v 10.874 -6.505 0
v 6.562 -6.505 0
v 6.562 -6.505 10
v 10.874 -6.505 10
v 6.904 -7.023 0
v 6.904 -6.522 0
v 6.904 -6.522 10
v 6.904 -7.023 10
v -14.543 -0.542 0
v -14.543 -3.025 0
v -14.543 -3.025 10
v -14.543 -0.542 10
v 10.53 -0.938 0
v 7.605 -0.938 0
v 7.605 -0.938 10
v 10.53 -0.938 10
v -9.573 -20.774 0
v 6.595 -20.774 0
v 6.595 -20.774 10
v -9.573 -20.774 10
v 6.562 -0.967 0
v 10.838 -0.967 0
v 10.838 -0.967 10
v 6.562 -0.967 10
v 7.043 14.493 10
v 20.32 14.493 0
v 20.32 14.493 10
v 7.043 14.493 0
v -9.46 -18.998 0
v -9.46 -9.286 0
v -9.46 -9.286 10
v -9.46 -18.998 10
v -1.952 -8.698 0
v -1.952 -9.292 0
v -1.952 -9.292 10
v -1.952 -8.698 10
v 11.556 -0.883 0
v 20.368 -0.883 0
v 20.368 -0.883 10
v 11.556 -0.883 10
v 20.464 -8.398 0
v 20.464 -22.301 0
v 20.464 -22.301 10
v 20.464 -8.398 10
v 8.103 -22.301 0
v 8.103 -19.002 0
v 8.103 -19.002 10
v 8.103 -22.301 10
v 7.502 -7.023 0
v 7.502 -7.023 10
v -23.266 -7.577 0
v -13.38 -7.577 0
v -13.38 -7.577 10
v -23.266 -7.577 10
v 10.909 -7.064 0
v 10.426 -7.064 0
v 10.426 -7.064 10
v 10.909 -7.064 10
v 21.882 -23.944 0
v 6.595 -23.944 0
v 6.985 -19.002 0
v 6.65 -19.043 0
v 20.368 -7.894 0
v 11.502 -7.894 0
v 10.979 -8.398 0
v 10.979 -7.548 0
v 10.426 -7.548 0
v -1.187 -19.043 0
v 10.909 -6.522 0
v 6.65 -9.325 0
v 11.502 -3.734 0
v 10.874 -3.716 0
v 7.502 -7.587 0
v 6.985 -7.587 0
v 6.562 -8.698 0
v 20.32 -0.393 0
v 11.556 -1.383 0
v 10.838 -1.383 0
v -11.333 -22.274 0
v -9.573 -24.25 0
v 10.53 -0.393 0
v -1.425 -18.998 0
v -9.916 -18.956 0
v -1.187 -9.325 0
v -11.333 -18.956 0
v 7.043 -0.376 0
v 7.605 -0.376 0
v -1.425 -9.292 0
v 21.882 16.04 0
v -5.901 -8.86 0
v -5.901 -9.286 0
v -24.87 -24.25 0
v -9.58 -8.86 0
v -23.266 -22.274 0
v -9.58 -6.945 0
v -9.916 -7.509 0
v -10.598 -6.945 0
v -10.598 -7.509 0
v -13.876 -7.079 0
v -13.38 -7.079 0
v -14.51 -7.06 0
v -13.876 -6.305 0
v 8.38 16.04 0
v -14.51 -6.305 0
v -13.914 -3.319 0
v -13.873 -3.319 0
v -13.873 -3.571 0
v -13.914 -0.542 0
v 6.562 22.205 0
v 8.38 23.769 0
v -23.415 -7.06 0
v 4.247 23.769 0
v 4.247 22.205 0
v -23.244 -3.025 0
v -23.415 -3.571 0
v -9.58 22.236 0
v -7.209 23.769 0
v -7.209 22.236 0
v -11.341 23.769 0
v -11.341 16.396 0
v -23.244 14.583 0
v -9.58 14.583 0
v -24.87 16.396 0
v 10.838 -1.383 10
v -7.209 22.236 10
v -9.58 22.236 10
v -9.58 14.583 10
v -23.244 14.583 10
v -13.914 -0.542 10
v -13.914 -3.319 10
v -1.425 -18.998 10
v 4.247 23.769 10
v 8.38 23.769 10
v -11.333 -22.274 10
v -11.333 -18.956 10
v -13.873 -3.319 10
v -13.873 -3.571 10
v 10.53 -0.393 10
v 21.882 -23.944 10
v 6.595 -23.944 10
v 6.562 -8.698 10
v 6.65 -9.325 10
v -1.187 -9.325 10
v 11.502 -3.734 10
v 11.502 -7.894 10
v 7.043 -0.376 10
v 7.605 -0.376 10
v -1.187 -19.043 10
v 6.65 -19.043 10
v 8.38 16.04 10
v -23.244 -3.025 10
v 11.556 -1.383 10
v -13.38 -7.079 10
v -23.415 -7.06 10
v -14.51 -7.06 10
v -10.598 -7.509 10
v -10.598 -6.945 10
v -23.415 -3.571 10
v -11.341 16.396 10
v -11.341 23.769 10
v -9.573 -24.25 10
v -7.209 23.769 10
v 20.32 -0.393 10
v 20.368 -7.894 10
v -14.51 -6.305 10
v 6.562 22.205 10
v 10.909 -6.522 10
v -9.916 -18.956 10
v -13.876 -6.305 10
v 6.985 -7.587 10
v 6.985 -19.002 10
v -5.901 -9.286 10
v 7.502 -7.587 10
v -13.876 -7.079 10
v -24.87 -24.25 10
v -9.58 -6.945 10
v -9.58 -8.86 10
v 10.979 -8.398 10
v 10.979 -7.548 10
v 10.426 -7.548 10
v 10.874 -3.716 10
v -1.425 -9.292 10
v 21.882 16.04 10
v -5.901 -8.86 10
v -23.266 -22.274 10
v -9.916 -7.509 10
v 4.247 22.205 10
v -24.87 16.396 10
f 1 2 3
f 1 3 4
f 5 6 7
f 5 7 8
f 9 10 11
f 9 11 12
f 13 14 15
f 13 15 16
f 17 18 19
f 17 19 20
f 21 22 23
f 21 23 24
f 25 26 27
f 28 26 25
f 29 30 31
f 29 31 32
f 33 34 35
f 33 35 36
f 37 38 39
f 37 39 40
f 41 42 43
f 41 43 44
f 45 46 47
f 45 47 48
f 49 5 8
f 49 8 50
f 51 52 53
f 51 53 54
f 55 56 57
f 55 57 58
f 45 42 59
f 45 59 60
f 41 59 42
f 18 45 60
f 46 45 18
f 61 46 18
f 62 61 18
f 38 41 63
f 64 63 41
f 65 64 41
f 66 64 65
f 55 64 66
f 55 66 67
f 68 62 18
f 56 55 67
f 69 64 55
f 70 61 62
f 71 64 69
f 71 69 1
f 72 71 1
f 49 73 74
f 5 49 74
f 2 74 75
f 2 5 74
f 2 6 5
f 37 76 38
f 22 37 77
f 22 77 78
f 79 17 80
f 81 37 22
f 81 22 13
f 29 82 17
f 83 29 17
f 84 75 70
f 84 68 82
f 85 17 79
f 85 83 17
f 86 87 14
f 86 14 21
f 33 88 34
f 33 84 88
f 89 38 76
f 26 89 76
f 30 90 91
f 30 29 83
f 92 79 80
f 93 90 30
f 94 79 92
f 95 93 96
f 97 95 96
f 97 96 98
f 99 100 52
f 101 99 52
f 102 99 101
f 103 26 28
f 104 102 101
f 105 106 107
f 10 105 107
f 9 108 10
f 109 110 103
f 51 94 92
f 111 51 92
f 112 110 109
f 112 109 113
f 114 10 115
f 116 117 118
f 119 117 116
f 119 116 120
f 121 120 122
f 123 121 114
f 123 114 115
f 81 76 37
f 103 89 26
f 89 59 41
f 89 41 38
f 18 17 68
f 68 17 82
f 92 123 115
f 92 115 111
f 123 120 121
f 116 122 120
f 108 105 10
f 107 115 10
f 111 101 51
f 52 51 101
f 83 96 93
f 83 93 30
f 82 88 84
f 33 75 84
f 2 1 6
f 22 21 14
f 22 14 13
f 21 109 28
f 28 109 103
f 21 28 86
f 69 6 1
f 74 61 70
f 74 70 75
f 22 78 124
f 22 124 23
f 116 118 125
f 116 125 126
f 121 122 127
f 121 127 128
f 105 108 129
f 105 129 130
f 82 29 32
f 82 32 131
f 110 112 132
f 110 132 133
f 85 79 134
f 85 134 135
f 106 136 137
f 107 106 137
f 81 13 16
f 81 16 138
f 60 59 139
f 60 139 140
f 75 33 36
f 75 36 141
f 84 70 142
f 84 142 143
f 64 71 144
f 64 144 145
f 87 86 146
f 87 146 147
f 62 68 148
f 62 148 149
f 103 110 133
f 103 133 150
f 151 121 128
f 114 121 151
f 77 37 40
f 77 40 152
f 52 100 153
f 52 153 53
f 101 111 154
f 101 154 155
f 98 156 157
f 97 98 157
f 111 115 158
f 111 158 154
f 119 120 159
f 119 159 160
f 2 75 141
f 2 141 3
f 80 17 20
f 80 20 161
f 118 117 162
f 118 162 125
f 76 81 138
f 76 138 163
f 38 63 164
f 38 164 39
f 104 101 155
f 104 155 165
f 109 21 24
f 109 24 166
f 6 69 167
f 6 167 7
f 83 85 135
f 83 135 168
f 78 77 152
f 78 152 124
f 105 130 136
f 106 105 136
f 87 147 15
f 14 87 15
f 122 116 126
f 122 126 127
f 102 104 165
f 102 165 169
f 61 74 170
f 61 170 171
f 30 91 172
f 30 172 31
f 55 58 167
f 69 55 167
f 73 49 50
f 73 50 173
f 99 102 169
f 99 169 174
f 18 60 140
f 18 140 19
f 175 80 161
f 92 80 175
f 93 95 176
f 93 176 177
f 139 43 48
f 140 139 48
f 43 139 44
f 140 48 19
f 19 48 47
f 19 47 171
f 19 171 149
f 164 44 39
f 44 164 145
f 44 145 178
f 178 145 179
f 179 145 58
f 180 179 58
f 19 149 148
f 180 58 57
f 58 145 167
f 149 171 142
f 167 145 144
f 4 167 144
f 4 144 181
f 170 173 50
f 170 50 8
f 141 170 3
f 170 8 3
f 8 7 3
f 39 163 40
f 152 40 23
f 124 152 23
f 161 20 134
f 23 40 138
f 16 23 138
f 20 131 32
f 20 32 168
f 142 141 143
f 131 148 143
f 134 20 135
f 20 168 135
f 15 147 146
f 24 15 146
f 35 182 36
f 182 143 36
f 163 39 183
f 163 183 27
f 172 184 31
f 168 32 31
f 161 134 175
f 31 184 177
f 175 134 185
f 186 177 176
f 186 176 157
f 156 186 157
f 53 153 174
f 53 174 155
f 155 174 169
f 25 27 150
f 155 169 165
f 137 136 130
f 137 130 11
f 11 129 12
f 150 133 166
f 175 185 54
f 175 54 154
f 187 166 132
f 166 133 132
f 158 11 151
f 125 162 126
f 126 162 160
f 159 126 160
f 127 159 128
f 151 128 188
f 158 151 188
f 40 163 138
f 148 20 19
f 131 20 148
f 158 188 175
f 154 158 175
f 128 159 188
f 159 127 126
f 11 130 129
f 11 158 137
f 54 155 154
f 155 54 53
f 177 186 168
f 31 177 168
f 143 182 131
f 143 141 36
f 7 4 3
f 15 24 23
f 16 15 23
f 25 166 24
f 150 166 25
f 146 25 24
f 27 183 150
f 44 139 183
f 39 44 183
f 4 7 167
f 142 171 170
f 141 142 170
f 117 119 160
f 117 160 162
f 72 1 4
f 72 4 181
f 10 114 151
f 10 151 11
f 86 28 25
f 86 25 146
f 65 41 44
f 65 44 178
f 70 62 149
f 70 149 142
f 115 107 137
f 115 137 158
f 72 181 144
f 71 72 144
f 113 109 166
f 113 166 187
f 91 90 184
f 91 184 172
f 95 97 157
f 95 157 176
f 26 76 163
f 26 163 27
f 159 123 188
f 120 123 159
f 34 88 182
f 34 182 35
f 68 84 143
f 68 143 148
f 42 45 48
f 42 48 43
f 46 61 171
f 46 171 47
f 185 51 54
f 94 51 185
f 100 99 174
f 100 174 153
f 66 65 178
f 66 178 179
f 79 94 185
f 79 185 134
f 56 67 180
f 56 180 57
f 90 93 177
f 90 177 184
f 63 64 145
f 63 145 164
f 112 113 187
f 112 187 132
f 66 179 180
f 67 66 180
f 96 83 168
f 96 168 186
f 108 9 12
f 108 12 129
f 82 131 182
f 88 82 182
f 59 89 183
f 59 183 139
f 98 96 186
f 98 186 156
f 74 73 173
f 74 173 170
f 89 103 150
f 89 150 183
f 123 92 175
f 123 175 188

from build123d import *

# Parameters (mm, degrees)
PAD_DEPTH            = 10
POCKET_DEPTH         = 0.001
POCKET_DEPTH_BACK    = 10.001
POCKET001_DEPTH      = 0.001
POCKET001_DEPTH_BACK = 10.001
POCKET002_DEPTH      = 0.001
POCKET002_DEPTH_BACK = 10.001
POCKET003_DEPTH      = 0.001
POCKET003_DEPTH_BACK = 10.001
POCKET004_DEPTH      = 0.001
POCKET004_DEPTH_BACK = 10.001
POCKET005_DEPTH      = 0.001
POCKET005_DEPTH_BACK = 10.001
POCKET006_DEPTH      = 0.001
POCKET006_DEPTH_BACK = 10.001
POCKET007_DEPTH      = 0.001
POCKET007_DEPTH_BACK = 10.001


with BuildPart() as part:
    # Sketch → Pad (new body)
    with BuildSketch(Plane.XY):
        Polygon((-24.869964, 16.395561), (-11.340966, 16.395561), (-11.340966, 23.768572), (8.37961, 23.768572), (8.37961, 16.040237), (21.881983, 16.040237), (21.881983, -23.94381), (6.594811, -23.94381), (6.594811, -20.773636), (-9.572513, -20.773636), (-9.572513, -24.250378), (-24.869964, -24.250378), align=None)
    extrude(amount=PAD_DEPTH)

    # Sketch001 → Pocket (cut, two sides)
    with BuildSketch(Plane.XY) as pocket_sk:
        Polygon((7.042854, 14.493185), (7.042854, -0.376181), (7.60472, -0.376181), (7.60472, -0.938048), (10.529679, -0.938048), (10.529679, -0.392844), (20.320467, -0.392844), (20.320467, 4.433404), (20.320467, 12.107393), (20.320467, 14.493185), (11.347224, 14.493185), (7.737097, 14.493185), align=None)
    extrude(amount=-POCKET_DEPTH, mode=Mode.SUBTRACT)
    extrude(pocket_sk.sketch, amount=POCKET_DEPTH_BACK, mode=Mode.SUBTRACT)

    # Sketch002 → Pocket001 (cut, two sides)
    with BuildSketch(Plane.XY) as pocket001_sk:
        Polygon((6.562266, -8.697514), (6.562266, 17.730482), (6.562266, 20.972402), (6.562266, 22.205465), (4.247283, 22.205465), (4.247283, 23.77135), (-7.208705, 23.77135), (-7.208705, 22.236126), (-9.579967, 22.236126), (-9.579967, 20.501596), (-9.579967, 17.725863), (-9.579967, -8.859713), (-5.78053, -8.859713), (-5.78053, -9.246999), (-1.996924, -9.246999), (-1.996924, -8.697514), align=None)
    extrude(amount=-POCKET001_DEPTH, mode=Mode.SUBTRACT)
    extrude(pocket001_sk.sketch, amount=POCKET001_DEPTH_BACK, mode=Mode.SUBTRACT)

    # Sketch003 → Pocket002 (cut, two sides)
    with BuildSketch(Plane.XY) as pocket002_sk:
        Polygon((-9.555696, 14.58253), (-11.251103, 14.58253), (-14.140704, 14.58253), (-23.244276, 14.58253), (-23.244276, 10.916287), (-23.244276, 3.175509), (-23.244276, -3.024841), (-14.543381, -3.024841), (-14.543381, -0.542157), (-13.913779, -0.542157), (-13.913779, -3.319152), (-9.555696, -3.319152), align=None)
    extrude(amount=-POCKET002_DEPTH, mode=Mode.SUBTRACT)
    extrude(pocket002_sk.sketch, amount=POCKET002_DEPTH_BACK, mode=Mode.SUBTRACT)

    # Sketch004 → Pocket003 (cut, two sides)
    with BuildSketch(Plane.XY) as pocket003_sk:
        Polygon((-23.265747, -7.57667), (-23.265747, -22.274162), (-20.999838, -22.274162), (-13.232408, -22.274162), (-11.332763, -22.274162), (-11.332763, -18.95647), (-9.916094, -18.95647), (-9.916094, -7.509449), (-10.598124, -7.509449), (-10.598124, -6.945273), (-9.384972, -6.945273), (-9.384972, -0.656561), (-13.872682, -0.656561), (-13.872682, -3.571327), (-23.414576, -3.571327), (-23.414576, -7.059722), (-14.509603, -7.059722), (-14.509603, -6.304652), (-13.875799, -6.304652), (-13.875799, -7.078746), (-13.37953, -7.078746), (-13.37953, -7.57667), align=None)
    extrude(amount=-POCKET003_DEPTH, mode=Mode.SUBTRACT)
    extrude(pocket003_sk.sketch, amount=POCKET003_DEPTH_BACK, mode=Mode.SUBTRACT)

    # Sketch005 → Pocket004 (cut, two sides)
    with BuildSketch(Plane.XY) as pocket004_sk:
        Polygon((-9.459572, -9.286458), (-9.459572, -18.99835), (-6.993228, -18.99835), (-2.81149, -18.99835), (-1.42501, -18.99835), (-1.42501, -9.292158), (-1.95218, -9.292158), (-1.95218, -8.499968), (-5.901244, -8.499968), (-5.901244, -9.286458), align=None)
    extrude(amount=-POCKET004_DEPTH, mode=Mode.SUBTRACT)
    extrude(pocket004_sk.sketch, amount=POCKET004_DEPTH_BACK, mode=Mode.SUBTRACT)

    # Sketch006 → Pocket005 (cut, two sides)
    with BuildSketch(Plane.XY) as pocket005_sk:
        Polygon((-1.187414, -9.325391), (-1.187414, -19.042973), (3.81931, -19.042973), (6.650182, -19.042973), (6.650182, -9.325391), align=None)
    extrude(amount=-POCKET005_DEPTH, mode=Mode.SUBTRACT)
    extrude(pocket005_sk.sketch, amount=POCKET005_DEPTH_BACK, mode=Mode.SUBTRACT)

    # Sketch007 → Pocket006 (cut, two sides)
    with BuildSketch(Plane.XY) as pocket006_sk:
        Polygon((6.904032, -6.522334), (6.904032, -7.023237), (7.502099, -7.023237), (7.502099, -7.587341), (6.984618, -7.587341), (6.984618, -19.001835), (8.102534, -19.001835), (8.102534, -22.300638), (10.341199, -22.300638), (18.38561, -22.300638), (20.463644, -22.300638), (20.463644, -8.397645), (10.979427, -8.397645), (10.979427, -7.547909), (10.426148, -7.547909), (10.426148, -7.063529), (10.909175, -7.063529), (10.909175, -6.522334), align=None)
    extrude(amount=-POCKET006_DEPTH, mode=Mode.SUBTRACT)
    extrude(pocket006_sk.sketch, amount=POCKET006_DEPTH_BACK, mode=Mode.SUBTRACT)

    # Sketch008 → Pocket007 (cut, two sides)
    with BuildSketch(Plane.XY) as pocket007_sk:
        Polygon((11.501872, -3.733678), (11.501872, -7.893655), (20.367885, -7.893655), (20.367885, -5.953888), (20.367885, -2.59785), (20.367885, -0.882918), (11.555678, -0.882918), (11.555678, -1.383317), (10.838286, -1.383317), (10.838286, -0.96668), (6.526137, -0.96668), (6.526137, -6.505466), (10.874155, -6.505466), (10.874155, -3.715743), align=None)
    extrude(amount=-POCKET007_DEPTH, mode=Mode.SUBTRACT)
    extrude(pocket007_sk.sketch, amount=POCKET007_DEPTH_BACK, mode=Mode.SUBTRACT)


solid = part.part
